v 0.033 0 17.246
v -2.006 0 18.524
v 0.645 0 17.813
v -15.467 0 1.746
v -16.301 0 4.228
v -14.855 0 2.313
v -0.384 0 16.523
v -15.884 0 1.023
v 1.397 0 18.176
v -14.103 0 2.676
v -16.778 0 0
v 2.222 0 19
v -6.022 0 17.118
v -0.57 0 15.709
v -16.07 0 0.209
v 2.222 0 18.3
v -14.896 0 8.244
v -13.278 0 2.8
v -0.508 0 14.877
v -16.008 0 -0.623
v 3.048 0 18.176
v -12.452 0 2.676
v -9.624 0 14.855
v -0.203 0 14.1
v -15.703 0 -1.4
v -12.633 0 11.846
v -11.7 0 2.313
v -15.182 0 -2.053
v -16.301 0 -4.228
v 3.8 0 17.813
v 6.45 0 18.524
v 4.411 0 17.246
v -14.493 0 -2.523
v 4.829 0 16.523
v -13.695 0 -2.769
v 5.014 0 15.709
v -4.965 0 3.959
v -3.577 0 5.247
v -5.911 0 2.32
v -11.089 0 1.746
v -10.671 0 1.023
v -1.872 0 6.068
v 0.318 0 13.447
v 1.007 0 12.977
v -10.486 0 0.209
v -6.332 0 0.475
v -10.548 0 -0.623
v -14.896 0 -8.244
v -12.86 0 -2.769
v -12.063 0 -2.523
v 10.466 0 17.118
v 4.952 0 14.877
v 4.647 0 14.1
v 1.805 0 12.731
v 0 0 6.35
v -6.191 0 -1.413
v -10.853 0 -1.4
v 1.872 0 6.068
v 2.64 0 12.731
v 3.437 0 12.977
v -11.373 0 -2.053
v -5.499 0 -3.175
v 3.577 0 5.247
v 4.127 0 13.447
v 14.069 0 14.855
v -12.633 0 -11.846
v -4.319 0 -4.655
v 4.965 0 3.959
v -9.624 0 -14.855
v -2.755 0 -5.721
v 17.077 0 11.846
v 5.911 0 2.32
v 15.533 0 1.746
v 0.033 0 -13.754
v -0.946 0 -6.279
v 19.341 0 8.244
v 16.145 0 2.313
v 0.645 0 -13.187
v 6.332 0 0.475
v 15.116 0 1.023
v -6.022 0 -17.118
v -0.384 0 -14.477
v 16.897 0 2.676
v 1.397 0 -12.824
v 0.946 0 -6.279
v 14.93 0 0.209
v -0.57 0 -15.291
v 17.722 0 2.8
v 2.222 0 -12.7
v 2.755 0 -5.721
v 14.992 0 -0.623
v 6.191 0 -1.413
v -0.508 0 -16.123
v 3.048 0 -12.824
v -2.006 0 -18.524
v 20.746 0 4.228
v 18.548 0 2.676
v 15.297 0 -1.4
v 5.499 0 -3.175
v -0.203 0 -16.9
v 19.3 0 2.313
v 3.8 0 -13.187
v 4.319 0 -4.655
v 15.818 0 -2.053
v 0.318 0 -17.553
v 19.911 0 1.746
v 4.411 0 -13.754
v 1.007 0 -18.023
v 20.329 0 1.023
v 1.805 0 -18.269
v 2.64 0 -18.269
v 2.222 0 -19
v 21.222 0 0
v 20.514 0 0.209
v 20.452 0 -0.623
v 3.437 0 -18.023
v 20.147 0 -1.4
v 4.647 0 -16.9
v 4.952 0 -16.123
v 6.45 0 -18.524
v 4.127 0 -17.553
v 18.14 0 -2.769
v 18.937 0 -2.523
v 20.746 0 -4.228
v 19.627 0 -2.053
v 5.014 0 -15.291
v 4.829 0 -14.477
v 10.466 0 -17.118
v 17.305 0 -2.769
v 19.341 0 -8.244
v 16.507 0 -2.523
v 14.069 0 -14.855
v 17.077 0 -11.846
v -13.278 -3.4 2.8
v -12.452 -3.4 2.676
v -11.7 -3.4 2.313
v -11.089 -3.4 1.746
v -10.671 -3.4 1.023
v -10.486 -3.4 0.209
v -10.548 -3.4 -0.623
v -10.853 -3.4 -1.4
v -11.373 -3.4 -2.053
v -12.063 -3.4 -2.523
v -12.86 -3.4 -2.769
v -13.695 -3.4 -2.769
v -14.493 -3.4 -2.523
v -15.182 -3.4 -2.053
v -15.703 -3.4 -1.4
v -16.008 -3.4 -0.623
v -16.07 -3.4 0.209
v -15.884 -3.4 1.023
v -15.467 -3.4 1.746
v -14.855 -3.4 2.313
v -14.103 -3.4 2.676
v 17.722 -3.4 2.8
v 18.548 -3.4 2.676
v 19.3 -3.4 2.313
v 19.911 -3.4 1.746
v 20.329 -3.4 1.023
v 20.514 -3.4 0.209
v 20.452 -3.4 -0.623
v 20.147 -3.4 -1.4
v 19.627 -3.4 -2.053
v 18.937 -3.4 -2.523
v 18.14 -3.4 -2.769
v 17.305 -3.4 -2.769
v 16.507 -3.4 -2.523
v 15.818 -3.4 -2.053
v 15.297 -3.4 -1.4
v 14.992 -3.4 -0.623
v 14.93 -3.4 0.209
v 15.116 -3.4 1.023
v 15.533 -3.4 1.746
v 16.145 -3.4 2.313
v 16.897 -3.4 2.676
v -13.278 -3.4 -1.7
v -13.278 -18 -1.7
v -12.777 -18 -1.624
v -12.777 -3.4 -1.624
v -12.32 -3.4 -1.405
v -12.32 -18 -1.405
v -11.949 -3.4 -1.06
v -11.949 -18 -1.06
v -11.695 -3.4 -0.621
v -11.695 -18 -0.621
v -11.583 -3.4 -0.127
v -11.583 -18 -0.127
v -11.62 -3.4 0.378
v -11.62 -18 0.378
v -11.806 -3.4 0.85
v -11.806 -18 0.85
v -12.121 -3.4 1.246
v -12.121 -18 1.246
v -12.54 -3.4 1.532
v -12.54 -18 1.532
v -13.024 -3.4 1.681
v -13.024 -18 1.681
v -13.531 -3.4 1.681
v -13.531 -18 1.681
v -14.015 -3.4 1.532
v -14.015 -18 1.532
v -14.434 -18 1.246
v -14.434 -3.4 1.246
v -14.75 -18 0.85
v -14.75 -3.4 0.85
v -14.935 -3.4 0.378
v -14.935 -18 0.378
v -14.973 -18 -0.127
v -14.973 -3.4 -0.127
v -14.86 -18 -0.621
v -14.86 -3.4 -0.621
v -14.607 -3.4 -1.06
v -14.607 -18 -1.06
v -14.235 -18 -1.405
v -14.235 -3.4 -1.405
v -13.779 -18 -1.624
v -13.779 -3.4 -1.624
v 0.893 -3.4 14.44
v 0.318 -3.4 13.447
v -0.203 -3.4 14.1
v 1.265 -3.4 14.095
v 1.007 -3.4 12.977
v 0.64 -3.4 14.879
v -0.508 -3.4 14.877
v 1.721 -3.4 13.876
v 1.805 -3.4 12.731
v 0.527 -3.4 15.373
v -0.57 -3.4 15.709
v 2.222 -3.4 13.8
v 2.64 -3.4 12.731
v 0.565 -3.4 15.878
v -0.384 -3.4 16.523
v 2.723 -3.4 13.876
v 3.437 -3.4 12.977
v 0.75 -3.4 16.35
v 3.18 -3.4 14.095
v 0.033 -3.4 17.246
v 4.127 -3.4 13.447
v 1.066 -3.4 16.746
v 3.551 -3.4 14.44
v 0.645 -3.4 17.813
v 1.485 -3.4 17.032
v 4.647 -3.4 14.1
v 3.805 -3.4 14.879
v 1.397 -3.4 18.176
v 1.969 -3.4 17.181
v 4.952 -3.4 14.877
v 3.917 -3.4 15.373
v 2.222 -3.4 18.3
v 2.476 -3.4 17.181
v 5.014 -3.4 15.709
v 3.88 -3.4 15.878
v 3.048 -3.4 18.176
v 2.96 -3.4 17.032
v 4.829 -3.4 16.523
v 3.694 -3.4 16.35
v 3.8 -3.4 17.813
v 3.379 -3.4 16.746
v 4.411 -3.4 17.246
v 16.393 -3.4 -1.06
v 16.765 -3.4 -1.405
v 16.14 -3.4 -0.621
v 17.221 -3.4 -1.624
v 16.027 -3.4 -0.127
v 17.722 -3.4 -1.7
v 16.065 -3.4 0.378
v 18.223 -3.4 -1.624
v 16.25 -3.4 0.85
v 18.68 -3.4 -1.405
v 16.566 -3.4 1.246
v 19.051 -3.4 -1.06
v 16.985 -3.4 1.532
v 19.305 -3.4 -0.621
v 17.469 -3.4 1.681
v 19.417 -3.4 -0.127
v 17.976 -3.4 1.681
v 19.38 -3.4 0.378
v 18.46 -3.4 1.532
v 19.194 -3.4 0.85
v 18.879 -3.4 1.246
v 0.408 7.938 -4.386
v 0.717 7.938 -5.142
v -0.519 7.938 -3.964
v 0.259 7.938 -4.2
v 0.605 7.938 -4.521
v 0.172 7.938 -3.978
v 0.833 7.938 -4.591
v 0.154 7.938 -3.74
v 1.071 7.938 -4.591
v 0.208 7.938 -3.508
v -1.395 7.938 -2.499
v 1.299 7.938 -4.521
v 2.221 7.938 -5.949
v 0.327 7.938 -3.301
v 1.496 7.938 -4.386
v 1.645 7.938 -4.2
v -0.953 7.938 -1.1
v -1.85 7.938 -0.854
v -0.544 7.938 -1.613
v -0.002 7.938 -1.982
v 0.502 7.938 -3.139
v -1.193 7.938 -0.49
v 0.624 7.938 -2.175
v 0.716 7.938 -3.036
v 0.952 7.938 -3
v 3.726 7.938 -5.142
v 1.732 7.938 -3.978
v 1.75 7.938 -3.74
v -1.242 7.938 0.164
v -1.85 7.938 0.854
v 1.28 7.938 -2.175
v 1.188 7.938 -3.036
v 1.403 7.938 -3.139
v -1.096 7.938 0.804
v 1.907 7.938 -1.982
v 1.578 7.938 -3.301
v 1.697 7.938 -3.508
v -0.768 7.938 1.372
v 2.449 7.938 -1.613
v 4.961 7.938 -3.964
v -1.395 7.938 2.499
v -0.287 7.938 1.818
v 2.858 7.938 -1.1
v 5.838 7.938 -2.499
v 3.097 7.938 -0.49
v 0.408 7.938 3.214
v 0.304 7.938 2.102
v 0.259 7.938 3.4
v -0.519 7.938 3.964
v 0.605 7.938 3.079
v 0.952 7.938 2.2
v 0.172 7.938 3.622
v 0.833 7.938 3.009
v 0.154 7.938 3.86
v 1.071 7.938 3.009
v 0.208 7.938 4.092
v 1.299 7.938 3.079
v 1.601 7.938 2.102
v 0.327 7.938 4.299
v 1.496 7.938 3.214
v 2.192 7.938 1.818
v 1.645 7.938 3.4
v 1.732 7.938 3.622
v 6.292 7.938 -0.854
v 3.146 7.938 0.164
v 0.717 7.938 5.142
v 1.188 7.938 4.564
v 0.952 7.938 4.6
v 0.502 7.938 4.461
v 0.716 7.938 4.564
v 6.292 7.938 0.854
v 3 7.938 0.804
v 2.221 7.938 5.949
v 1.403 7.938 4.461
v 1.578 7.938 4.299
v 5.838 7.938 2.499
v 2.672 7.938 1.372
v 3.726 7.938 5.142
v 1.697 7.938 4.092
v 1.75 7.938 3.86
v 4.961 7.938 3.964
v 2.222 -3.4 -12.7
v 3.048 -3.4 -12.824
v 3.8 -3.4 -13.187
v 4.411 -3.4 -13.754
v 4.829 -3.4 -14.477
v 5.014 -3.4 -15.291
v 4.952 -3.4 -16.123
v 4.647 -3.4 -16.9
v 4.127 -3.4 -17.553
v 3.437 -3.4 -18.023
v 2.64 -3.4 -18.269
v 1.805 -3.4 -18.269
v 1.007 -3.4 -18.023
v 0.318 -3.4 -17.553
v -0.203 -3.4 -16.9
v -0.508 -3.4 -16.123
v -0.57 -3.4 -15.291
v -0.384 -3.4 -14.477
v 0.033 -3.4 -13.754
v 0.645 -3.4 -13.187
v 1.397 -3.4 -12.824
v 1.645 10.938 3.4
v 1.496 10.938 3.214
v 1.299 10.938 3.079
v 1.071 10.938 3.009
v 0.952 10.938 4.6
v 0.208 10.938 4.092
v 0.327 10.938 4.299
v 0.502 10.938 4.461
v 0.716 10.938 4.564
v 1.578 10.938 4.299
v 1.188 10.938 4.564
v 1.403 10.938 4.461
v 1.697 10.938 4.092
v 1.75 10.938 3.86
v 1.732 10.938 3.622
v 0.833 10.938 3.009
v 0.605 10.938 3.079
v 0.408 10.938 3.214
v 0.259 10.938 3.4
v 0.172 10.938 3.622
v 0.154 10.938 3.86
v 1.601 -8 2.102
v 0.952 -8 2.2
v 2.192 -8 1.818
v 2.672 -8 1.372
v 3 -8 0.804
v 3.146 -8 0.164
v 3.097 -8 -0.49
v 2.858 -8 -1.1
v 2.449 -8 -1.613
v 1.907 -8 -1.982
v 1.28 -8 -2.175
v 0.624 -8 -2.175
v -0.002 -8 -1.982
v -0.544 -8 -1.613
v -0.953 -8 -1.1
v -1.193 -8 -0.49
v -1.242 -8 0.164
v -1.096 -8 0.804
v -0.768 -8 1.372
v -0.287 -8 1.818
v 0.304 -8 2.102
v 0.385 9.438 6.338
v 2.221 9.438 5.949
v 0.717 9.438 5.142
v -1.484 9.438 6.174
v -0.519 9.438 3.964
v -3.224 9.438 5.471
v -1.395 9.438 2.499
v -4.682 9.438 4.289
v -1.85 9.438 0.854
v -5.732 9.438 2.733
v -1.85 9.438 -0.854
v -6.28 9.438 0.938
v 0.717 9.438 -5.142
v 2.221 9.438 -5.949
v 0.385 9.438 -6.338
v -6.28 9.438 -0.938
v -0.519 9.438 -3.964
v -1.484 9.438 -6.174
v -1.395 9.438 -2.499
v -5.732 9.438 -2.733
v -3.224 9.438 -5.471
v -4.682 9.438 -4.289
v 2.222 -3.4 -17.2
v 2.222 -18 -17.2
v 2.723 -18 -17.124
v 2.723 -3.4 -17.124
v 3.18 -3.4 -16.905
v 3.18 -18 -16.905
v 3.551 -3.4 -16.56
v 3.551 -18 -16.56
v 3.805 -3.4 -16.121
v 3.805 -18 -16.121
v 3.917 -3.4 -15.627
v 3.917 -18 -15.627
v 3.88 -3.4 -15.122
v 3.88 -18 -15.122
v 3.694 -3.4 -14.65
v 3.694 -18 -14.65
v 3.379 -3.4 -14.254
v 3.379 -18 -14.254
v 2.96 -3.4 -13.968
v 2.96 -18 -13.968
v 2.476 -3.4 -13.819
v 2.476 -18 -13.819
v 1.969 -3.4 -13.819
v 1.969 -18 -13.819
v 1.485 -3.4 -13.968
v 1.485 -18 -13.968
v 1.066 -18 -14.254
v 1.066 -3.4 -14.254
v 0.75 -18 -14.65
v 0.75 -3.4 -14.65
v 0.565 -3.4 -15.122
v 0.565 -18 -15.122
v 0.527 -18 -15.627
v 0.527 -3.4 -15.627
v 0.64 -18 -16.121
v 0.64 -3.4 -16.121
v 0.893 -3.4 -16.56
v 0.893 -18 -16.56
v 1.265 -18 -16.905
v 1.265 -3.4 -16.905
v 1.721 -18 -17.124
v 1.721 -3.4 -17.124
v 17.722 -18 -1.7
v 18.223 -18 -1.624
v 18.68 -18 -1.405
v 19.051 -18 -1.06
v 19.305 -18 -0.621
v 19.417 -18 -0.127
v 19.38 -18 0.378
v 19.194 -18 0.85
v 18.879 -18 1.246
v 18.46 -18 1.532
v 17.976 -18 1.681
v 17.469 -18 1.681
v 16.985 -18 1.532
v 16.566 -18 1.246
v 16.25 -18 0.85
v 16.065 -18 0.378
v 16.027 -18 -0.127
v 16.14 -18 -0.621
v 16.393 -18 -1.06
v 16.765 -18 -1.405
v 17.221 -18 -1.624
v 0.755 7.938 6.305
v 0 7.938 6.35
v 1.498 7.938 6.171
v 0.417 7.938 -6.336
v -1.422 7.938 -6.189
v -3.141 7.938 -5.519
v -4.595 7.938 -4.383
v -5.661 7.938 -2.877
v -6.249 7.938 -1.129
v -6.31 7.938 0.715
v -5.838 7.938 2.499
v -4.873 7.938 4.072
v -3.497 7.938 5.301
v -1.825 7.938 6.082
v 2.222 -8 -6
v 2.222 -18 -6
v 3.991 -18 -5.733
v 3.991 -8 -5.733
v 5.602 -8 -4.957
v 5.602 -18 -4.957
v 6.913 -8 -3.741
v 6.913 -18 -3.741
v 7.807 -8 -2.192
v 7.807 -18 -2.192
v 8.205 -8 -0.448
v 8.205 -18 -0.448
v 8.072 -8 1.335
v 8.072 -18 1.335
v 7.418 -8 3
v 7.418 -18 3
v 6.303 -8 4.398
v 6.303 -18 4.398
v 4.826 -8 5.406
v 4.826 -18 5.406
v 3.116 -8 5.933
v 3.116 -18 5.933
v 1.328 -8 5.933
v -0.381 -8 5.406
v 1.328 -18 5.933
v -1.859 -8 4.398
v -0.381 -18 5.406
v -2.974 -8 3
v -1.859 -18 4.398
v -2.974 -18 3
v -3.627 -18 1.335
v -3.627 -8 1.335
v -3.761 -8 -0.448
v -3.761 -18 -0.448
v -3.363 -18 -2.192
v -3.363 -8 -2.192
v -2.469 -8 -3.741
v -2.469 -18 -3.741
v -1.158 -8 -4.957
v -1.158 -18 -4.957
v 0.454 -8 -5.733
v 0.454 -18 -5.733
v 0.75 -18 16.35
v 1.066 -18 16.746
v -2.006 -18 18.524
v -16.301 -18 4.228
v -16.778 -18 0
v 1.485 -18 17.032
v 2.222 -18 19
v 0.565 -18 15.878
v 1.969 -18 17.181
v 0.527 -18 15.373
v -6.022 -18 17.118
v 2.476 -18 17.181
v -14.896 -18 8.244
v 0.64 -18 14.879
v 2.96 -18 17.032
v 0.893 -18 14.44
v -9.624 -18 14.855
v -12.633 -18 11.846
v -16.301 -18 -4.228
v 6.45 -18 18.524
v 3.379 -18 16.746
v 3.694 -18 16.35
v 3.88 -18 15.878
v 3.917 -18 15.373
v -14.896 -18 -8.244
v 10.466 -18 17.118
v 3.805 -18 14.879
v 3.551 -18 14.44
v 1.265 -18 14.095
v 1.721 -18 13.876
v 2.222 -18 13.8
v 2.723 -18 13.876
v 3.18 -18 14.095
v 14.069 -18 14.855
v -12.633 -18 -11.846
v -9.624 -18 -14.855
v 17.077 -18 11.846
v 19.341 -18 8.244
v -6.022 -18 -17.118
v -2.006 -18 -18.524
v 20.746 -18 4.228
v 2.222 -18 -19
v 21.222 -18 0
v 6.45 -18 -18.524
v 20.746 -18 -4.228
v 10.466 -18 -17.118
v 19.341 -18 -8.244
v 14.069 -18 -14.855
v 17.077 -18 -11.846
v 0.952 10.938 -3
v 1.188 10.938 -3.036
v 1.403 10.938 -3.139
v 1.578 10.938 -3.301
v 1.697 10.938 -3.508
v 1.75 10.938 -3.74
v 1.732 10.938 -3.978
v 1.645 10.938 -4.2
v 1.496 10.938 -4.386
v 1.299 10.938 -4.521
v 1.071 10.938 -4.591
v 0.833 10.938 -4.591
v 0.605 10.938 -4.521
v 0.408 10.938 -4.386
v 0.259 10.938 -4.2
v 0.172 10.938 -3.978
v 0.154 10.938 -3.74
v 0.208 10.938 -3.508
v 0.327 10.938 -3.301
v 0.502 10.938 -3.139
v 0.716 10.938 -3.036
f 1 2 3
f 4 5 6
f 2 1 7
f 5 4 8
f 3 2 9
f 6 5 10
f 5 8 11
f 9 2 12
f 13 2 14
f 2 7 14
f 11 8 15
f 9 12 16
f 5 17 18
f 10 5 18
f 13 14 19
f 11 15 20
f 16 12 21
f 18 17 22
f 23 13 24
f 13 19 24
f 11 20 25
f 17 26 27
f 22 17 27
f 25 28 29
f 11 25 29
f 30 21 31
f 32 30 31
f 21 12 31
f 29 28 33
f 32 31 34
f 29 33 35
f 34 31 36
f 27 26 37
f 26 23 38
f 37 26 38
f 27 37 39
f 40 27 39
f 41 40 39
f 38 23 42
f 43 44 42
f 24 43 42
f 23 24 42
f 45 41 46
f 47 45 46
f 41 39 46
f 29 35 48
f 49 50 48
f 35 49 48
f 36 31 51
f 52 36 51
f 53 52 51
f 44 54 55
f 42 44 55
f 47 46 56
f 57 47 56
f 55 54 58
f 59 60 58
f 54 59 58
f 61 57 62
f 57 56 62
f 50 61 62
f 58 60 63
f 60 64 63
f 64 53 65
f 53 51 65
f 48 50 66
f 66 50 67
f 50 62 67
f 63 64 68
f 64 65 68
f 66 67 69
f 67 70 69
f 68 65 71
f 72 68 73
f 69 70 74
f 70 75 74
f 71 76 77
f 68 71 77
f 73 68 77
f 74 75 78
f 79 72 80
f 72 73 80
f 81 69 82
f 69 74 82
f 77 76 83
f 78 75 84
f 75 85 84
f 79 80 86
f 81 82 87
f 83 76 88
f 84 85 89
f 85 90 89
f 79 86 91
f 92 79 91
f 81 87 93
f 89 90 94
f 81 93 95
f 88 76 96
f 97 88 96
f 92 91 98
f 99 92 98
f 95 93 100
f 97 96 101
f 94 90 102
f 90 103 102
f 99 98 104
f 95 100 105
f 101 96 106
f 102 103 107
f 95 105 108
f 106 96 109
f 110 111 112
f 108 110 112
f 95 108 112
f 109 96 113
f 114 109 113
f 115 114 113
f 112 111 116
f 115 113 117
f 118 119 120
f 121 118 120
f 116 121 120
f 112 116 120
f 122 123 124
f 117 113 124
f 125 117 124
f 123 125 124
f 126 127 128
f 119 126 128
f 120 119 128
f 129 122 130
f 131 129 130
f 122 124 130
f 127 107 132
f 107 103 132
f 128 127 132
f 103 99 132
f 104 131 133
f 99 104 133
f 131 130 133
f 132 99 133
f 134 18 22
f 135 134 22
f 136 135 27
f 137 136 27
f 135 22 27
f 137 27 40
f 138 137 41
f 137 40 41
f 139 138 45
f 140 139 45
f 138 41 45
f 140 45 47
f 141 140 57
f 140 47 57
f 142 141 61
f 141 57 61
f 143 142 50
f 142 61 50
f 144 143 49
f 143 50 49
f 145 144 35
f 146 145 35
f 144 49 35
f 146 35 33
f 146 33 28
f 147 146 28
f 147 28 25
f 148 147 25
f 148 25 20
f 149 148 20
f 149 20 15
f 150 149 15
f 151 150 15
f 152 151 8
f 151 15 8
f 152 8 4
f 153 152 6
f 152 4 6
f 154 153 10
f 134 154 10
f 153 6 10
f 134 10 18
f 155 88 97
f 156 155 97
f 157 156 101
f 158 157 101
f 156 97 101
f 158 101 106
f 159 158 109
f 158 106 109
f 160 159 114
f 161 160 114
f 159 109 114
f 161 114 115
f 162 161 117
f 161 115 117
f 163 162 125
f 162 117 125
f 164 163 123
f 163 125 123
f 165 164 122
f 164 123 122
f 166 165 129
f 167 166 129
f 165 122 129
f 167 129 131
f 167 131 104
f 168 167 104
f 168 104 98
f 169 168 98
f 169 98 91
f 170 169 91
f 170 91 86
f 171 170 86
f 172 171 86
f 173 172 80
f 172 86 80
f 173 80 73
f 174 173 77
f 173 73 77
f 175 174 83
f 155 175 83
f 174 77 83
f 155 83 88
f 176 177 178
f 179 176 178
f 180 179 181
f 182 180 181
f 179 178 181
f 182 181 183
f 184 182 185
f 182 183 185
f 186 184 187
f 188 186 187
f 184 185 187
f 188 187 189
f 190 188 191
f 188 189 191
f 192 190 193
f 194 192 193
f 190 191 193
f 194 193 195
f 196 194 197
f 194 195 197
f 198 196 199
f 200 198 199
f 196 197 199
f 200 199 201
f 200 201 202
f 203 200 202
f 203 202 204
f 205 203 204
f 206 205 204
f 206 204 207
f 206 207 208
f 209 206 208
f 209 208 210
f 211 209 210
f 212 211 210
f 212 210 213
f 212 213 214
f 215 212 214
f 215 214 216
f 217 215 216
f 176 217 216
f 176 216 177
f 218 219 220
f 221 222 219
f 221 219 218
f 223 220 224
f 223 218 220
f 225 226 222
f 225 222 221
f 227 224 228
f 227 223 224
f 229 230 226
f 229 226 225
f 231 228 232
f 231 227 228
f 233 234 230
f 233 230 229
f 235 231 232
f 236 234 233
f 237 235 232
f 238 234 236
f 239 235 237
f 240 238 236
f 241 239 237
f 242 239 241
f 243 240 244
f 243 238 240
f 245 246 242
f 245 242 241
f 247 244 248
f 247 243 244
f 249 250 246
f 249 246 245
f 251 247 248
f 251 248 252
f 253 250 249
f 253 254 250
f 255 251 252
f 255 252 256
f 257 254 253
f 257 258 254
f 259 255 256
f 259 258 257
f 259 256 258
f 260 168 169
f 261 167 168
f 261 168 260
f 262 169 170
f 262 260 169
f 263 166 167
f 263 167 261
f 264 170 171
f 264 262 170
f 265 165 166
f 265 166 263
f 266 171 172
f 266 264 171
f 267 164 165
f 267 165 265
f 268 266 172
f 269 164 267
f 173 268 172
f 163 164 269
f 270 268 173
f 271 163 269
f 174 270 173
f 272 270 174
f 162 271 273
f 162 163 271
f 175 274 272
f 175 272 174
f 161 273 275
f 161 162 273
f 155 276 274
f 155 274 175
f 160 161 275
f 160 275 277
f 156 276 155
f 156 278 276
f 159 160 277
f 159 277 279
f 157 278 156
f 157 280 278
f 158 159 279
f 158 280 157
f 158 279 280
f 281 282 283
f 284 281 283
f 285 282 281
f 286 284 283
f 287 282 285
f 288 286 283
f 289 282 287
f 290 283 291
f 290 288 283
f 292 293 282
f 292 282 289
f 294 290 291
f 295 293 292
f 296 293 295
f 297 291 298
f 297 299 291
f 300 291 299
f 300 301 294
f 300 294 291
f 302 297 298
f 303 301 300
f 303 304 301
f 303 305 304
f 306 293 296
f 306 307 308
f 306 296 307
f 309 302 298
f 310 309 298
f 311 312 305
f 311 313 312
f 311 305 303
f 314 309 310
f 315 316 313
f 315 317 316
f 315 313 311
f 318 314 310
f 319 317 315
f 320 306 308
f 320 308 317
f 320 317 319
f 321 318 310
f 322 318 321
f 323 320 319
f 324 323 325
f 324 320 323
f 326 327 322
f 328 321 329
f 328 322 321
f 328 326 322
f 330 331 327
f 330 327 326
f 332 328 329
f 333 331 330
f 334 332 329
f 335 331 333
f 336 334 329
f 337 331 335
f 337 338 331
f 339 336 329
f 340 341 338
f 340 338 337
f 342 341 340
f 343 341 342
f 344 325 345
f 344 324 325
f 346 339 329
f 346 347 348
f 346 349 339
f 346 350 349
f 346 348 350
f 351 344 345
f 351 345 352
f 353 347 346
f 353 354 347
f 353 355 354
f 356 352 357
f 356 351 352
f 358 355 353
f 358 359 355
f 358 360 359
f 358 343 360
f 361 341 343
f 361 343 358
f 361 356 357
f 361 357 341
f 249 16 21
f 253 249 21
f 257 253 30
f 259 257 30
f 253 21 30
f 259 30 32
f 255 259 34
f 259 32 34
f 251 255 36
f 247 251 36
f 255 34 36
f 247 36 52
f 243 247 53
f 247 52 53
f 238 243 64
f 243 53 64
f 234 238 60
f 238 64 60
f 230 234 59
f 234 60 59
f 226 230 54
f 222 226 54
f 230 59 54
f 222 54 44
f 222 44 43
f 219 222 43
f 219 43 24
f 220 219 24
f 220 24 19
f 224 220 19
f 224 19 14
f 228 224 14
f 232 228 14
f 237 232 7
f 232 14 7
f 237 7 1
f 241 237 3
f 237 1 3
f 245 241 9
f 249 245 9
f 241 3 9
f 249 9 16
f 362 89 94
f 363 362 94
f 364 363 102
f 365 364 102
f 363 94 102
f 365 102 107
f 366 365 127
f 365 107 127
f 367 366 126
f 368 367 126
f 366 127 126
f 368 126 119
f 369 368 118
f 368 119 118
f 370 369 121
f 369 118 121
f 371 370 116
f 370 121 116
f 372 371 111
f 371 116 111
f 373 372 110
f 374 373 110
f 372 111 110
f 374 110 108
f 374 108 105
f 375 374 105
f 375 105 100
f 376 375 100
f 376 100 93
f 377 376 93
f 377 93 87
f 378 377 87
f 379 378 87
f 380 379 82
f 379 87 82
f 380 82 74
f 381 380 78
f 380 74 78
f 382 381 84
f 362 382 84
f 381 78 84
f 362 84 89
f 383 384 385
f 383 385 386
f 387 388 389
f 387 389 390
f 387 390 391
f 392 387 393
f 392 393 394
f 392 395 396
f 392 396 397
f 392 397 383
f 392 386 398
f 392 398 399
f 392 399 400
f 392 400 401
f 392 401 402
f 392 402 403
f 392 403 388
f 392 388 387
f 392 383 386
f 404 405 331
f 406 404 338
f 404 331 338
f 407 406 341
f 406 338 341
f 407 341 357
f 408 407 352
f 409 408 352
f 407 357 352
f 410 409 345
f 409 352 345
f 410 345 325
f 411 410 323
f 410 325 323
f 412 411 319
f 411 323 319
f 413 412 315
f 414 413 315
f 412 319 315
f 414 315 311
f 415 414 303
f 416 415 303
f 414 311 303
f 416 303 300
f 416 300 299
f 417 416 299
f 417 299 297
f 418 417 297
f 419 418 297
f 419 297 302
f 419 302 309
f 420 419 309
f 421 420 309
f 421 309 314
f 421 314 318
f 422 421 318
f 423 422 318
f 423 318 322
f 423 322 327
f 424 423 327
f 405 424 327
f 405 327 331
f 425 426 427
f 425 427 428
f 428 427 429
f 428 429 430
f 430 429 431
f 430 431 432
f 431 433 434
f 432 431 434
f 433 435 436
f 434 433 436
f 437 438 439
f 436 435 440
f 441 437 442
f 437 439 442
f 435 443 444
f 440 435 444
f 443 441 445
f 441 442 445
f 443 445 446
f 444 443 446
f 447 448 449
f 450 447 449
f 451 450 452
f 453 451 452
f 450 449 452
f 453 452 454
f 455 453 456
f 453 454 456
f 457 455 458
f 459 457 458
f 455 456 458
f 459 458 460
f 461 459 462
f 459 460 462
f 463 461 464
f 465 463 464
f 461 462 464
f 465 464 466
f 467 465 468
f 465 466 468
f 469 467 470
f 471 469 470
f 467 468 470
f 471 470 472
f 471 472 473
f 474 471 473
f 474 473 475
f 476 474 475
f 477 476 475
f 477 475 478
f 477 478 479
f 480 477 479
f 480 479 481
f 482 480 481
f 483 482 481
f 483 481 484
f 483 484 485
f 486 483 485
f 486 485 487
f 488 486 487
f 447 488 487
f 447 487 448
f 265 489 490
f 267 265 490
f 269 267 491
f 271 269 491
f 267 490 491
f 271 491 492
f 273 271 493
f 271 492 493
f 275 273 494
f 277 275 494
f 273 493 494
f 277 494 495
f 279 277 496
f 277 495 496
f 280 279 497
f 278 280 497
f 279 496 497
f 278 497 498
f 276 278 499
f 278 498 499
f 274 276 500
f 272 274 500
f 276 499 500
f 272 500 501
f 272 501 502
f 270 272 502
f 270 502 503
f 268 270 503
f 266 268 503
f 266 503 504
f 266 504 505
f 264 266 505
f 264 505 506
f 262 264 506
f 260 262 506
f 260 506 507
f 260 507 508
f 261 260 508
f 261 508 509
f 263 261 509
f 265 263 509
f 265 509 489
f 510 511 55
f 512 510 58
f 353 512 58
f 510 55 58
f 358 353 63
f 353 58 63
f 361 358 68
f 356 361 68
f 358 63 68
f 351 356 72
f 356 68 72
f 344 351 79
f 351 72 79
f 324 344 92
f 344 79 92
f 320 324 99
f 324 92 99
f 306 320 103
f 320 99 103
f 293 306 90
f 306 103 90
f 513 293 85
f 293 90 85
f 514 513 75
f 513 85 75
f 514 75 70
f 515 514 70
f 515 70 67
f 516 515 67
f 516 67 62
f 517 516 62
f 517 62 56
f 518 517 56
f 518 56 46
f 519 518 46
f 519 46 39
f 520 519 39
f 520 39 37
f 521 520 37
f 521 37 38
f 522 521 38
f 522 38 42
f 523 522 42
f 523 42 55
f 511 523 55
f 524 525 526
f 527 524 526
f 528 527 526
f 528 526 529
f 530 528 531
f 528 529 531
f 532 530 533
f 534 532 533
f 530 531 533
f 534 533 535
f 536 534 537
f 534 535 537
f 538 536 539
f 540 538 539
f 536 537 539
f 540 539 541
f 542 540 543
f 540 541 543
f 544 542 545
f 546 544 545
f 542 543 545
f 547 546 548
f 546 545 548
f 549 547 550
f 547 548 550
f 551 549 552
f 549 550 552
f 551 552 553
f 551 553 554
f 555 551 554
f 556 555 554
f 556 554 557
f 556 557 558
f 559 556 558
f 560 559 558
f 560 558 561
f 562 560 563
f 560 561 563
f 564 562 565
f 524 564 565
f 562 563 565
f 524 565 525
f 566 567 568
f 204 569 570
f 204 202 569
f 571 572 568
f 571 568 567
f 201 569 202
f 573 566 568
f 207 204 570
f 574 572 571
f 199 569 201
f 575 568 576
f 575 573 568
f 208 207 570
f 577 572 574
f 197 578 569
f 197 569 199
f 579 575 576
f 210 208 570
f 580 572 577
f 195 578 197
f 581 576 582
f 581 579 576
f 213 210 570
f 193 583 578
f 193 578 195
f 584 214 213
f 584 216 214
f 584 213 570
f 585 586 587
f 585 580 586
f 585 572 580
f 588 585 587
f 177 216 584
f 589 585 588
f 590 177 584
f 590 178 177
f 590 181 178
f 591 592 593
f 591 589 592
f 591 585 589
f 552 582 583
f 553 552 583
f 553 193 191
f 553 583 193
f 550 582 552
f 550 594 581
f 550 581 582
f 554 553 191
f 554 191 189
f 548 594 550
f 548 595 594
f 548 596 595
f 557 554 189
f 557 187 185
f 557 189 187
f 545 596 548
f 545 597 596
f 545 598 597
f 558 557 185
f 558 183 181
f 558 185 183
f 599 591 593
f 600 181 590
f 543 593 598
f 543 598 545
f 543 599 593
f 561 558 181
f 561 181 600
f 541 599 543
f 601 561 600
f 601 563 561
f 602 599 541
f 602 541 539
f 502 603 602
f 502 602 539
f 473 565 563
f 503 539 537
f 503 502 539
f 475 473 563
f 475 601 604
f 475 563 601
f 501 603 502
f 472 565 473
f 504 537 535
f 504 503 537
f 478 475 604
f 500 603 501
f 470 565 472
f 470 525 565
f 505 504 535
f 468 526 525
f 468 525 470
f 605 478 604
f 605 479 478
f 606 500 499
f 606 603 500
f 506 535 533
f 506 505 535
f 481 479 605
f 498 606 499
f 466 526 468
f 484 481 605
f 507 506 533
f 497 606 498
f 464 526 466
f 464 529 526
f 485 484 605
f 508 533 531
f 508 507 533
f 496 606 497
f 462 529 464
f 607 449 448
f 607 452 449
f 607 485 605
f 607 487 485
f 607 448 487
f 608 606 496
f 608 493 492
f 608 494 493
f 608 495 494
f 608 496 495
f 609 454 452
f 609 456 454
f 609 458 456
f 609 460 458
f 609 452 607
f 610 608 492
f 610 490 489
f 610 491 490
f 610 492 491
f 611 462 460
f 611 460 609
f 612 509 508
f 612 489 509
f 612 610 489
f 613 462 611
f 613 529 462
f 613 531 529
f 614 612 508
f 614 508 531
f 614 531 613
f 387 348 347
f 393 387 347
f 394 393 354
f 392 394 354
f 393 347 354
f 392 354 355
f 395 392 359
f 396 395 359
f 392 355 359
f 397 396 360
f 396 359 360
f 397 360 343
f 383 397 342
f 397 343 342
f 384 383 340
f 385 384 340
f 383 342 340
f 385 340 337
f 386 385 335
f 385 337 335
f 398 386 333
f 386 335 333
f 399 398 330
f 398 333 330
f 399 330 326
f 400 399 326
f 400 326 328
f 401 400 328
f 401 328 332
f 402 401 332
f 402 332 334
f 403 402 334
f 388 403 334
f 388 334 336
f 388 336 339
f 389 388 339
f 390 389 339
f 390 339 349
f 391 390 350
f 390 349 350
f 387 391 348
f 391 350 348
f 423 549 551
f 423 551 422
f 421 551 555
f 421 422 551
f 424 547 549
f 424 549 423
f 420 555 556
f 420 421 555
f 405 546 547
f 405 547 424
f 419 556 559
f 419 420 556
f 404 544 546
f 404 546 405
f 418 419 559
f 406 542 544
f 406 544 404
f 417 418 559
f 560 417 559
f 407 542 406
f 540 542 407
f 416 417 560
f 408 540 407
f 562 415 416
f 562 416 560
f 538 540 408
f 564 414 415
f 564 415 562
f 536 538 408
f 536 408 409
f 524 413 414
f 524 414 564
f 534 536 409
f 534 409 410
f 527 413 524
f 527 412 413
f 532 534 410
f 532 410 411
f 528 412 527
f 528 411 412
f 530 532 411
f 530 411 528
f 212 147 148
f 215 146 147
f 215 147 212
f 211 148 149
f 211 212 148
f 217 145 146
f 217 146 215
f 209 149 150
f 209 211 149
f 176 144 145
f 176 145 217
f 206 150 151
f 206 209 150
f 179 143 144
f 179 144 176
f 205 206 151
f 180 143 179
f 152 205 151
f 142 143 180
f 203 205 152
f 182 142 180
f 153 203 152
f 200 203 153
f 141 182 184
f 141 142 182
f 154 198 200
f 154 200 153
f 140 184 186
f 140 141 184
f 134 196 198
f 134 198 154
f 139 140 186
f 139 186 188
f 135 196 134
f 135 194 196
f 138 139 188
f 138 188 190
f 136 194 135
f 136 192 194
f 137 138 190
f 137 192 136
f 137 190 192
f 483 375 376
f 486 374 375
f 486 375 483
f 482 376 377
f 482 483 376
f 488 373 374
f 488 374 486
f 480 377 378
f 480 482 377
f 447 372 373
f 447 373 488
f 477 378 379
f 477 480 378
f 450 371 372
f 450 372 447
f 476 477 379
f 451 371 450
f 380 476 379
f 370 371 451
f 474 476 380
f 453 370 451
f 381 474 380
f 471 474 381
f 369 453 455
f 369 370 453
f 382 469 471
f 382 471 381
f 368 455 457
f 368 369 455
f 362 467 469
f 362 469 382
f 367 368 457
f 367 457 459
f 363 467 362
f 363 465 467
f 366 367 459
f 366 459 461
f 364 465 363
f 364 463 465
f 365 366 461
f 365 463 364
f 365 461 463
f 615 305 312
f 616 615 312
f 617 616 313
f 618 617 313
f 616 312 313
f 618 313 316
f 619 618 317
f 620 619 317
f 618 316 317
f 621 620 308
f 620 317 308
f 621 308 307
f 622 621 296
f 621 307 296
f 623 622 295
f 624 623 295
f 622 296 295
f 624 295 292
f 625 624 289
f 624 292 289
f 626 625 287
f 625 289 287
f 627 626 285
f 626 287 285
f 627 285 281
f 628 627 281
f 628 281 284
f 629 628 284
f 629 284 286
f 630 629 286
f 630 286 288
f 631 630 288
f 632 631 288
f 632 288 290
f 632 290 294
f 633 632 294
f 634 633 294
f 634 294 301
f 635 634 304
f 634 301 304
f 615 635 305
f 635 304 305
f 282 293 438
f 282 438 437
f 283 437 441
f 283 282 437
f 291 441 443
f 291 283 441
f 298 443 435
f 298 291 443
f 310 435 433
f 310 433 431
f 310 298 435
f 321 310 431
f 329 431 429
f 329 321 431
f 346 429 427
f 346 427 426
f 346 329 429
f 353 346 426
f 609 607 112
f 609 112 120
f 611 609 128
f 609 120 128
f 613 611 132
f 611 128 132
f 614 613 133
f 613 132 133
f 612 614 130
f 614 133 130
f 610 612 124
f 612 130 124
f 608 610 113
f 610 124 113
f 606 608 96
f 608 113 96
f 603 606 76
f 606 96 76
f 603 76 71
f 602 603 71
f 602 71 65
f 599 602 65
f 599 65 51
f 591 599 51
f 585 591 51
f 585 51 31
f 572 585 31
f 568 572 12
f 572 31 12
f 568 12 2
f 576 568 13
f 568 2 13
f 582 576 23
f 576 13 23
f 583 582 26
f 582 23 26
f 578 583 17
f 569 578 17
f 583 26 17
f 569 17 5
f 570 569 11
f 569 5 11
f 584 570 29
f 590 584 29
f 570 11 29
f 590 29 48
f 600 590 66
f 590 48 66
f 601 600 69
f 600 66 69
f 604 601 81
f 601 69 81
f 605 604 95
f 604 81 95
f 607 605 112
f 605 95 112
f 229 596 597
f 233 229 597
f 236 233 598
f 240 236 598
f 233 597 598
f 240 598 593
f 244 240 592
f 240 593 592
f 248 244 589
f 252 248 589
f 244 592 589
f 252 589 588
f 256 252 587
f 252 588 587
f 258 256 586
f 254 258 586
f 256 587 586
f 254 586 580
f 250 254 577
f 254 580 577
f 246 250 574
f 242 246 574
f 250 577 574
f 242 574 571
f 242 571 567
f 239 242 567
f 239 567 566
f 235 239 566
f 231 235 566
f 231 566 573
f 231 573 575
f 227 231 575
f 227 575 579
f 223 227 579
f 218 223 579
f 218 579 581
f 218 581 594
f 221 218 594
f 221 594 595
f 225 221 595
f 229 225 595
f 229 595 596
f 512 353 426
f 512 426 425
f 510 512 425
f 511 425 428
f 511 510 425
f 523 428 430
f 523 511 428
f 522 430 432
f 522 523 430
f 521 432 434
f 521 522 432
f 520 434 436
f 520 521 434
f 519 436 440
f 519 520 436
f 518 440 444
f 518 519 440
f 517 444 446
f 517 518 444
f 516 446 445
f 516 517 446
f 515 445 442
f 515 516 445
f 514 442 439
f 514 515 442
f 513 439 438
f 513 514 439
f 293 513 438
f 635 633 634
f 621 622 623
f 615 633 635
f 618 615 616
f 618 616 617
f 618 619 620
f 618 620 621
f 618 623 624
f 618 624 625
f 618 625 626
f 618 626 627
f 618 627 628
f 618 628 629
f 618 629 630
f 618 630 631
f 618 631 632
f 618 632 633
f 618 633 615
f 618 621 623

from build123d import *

# Parameters (mm, degrees)
SKETCH2_R           = 6.35
BOSS_EXTRUDE1_DEPTH = 7.9375
SKETCH7_R           = 19
BOSS_EXTRUDE5_DEPTH = 18
SKETCH8_R           = 1.7
CUT_EXTRUDE1_DEPTH  = 39.524506895
SKETCH9_R           = 2.8
CUT_EXTRUDE2_DEPTH  = 3.4
SKETCH6_R           = 2.2
CUT_EXTRUDE3_DEPTH  = 39.524506895
SKETCH10_R          = 3.9
CUT_EXTRUDE4_DEPTH  = 3
BOSS_EXTRUDE6_DEPTH = 1.5
SKETCH11_R          = 0.8
BOSS_EXTRUDE7_DEPTH = 3
SKETCH12_R          = 6
CUT_EXTRUDE5_DEPTH  = 10


with BuildPart() as part:
    # Sketch2 → Boss-Extrude1 (new body)
    with BuildSketch(Plane(origin=(0, 0, 0), x_dir=(1, 0, 0), z_dir=(0, 1, 0))):
        with Locations(Location((0, 0, 0), (0, 0, 270))):
            Circle(SKETCH2_R)
    extrude(amount=BOSS_EXTRUDE1_DEPTH)

    # Sketch7 → Boss-Extrude5 (add)
    with BuildSketch(Plane.XZ):
        with Locations(Location((2.222246, 0, 0), (0, 0, 270))):
            Circle(SKETCH7_R)
    extrude(amount=BOSS_EXTRUDE5_DEPTH)

    # Sketch8 → Cut-Extrude1 (cut, through all)
    with BuildSketch(Plane.XZ.offset(18)):
        with Locations(Location((2.222246, 15.5, 0), (0, 0, 270))):
            Circle(SKETCH8_R)
        with Locations(Location((17.722246, 0, 0), (0, 0, 270))):
            Circle(SKETCH8_R)
        with Locations(Location((2.222246, -15.5, 0), (0, 0, 270))):
            Circle(SKETCH8_R)
        with Locations(Location((-13.277754, 0, 0), (0, 0, 270))):
            Circle(SKETCH8_R)
    extrude(amount=-CUT_EXTRUDE1_DEPTH, mode=Mode.SUBTRACT)

    # Sketch9 → Cut-Extrude2 (cut)
    with BuildSketch(Plane(origin=(0, 0, 0), x_dir=(1, 0, 0), z_dir=(0, 1, 0))):
        with Locations(Location((2.222246, 15.5, 0), (0, 0, 270))):
            Circle(SKETCH9_R)
        with Locations(Location((17.722246, 0, 0), (0, 0, 270))):
            Circle(SKETCH9_R)
        with Locations(Location((2.222246, -15.5, 0), (0, 0, 270))):
            Circle(SKETCH9_R)
        with Locations(Location((-13.277754, 0, 0), (0, 0, 270))):
            Circle(SKETCH9_R)
    extrude(amount=-CUT_EXTRUDE2_DEPTH, mode=Mode.SUBTRACT)

    # Sketch6 → Cut-Extrude3 (cut, through all)
    with BuildSketch(Plane(origin=(0, 7.9375, 0), x_dir=(1, 0, 0), z_dir=(0, 1, 0))):
        with Locations(Location((0.952246, 0, 0), (0, 0, 270))):
            Circle(SKETCH6_R)
    extrude(amount=-CUT_EXTRUDE3_DEPTH, mode=Mode.SUBTRACT)

    # Sketch10 → Cut-Extrude4 (cut)
    with BuildSketch(Plane.XZ.offset(18)):
        with Locations(Location((0.952246, 0, 0), (0, 0, 270))):
            Circle(SKETCH10_R)
    extrude(amount=-CUT_EXTRUDE4_DEPTH, mode=Mode.SUBTRACT)

    # Sketch4 → Boss-Extrude6 (add)
    with BuildSketch(Plane(origin=(0, 7.9375, 0), x_dir=(1, 0, 0), z_dir=(0, 1, 0))):
        with BuildLine():
            ThreePointArc((2.221123, 5.948874904), (-1.907754, 0), (2.221123, -5.948874904))
            ThreePointArc((2.221123, -5.948874904), (-6.35, 0), (2.221123, 5.948874904))
        make_face()
    extrude(amount=BOSS_EXTRUDE6_DEPTH)

    # Sketch11 → Boss-Extrude7 (add)
    with BuildSketch(Plane(origin=(0, 7.9375, 0), x_dir=(1, 0, 0), z_dir=(0, 1, 0))):
        with Locations(Location((0.952246, 3.8, 0), (0, 0, 270))):
            Circle(SKETCH11_R)
        with Locations(Location((0.952246, -3.8, 0), (0, 0, 270))):
            Circle(SKETCH11_R)
    extrude(amount=BOSS_EXTRUDE7_DEPTH)

    # Sketch12 → Cut-Extrude5 (cut)
    with BuildSketch(Plane.XZ.offset(18)):
        with Locations(Location((2.222246, 0, 0), (0, 0, 270))):
            Circle(SKETCH12_R)
    extrude(amount=-CUT_EXTRUDE5_DEPTH, mode=Mode.SUBTRACT)


solid = part.part
